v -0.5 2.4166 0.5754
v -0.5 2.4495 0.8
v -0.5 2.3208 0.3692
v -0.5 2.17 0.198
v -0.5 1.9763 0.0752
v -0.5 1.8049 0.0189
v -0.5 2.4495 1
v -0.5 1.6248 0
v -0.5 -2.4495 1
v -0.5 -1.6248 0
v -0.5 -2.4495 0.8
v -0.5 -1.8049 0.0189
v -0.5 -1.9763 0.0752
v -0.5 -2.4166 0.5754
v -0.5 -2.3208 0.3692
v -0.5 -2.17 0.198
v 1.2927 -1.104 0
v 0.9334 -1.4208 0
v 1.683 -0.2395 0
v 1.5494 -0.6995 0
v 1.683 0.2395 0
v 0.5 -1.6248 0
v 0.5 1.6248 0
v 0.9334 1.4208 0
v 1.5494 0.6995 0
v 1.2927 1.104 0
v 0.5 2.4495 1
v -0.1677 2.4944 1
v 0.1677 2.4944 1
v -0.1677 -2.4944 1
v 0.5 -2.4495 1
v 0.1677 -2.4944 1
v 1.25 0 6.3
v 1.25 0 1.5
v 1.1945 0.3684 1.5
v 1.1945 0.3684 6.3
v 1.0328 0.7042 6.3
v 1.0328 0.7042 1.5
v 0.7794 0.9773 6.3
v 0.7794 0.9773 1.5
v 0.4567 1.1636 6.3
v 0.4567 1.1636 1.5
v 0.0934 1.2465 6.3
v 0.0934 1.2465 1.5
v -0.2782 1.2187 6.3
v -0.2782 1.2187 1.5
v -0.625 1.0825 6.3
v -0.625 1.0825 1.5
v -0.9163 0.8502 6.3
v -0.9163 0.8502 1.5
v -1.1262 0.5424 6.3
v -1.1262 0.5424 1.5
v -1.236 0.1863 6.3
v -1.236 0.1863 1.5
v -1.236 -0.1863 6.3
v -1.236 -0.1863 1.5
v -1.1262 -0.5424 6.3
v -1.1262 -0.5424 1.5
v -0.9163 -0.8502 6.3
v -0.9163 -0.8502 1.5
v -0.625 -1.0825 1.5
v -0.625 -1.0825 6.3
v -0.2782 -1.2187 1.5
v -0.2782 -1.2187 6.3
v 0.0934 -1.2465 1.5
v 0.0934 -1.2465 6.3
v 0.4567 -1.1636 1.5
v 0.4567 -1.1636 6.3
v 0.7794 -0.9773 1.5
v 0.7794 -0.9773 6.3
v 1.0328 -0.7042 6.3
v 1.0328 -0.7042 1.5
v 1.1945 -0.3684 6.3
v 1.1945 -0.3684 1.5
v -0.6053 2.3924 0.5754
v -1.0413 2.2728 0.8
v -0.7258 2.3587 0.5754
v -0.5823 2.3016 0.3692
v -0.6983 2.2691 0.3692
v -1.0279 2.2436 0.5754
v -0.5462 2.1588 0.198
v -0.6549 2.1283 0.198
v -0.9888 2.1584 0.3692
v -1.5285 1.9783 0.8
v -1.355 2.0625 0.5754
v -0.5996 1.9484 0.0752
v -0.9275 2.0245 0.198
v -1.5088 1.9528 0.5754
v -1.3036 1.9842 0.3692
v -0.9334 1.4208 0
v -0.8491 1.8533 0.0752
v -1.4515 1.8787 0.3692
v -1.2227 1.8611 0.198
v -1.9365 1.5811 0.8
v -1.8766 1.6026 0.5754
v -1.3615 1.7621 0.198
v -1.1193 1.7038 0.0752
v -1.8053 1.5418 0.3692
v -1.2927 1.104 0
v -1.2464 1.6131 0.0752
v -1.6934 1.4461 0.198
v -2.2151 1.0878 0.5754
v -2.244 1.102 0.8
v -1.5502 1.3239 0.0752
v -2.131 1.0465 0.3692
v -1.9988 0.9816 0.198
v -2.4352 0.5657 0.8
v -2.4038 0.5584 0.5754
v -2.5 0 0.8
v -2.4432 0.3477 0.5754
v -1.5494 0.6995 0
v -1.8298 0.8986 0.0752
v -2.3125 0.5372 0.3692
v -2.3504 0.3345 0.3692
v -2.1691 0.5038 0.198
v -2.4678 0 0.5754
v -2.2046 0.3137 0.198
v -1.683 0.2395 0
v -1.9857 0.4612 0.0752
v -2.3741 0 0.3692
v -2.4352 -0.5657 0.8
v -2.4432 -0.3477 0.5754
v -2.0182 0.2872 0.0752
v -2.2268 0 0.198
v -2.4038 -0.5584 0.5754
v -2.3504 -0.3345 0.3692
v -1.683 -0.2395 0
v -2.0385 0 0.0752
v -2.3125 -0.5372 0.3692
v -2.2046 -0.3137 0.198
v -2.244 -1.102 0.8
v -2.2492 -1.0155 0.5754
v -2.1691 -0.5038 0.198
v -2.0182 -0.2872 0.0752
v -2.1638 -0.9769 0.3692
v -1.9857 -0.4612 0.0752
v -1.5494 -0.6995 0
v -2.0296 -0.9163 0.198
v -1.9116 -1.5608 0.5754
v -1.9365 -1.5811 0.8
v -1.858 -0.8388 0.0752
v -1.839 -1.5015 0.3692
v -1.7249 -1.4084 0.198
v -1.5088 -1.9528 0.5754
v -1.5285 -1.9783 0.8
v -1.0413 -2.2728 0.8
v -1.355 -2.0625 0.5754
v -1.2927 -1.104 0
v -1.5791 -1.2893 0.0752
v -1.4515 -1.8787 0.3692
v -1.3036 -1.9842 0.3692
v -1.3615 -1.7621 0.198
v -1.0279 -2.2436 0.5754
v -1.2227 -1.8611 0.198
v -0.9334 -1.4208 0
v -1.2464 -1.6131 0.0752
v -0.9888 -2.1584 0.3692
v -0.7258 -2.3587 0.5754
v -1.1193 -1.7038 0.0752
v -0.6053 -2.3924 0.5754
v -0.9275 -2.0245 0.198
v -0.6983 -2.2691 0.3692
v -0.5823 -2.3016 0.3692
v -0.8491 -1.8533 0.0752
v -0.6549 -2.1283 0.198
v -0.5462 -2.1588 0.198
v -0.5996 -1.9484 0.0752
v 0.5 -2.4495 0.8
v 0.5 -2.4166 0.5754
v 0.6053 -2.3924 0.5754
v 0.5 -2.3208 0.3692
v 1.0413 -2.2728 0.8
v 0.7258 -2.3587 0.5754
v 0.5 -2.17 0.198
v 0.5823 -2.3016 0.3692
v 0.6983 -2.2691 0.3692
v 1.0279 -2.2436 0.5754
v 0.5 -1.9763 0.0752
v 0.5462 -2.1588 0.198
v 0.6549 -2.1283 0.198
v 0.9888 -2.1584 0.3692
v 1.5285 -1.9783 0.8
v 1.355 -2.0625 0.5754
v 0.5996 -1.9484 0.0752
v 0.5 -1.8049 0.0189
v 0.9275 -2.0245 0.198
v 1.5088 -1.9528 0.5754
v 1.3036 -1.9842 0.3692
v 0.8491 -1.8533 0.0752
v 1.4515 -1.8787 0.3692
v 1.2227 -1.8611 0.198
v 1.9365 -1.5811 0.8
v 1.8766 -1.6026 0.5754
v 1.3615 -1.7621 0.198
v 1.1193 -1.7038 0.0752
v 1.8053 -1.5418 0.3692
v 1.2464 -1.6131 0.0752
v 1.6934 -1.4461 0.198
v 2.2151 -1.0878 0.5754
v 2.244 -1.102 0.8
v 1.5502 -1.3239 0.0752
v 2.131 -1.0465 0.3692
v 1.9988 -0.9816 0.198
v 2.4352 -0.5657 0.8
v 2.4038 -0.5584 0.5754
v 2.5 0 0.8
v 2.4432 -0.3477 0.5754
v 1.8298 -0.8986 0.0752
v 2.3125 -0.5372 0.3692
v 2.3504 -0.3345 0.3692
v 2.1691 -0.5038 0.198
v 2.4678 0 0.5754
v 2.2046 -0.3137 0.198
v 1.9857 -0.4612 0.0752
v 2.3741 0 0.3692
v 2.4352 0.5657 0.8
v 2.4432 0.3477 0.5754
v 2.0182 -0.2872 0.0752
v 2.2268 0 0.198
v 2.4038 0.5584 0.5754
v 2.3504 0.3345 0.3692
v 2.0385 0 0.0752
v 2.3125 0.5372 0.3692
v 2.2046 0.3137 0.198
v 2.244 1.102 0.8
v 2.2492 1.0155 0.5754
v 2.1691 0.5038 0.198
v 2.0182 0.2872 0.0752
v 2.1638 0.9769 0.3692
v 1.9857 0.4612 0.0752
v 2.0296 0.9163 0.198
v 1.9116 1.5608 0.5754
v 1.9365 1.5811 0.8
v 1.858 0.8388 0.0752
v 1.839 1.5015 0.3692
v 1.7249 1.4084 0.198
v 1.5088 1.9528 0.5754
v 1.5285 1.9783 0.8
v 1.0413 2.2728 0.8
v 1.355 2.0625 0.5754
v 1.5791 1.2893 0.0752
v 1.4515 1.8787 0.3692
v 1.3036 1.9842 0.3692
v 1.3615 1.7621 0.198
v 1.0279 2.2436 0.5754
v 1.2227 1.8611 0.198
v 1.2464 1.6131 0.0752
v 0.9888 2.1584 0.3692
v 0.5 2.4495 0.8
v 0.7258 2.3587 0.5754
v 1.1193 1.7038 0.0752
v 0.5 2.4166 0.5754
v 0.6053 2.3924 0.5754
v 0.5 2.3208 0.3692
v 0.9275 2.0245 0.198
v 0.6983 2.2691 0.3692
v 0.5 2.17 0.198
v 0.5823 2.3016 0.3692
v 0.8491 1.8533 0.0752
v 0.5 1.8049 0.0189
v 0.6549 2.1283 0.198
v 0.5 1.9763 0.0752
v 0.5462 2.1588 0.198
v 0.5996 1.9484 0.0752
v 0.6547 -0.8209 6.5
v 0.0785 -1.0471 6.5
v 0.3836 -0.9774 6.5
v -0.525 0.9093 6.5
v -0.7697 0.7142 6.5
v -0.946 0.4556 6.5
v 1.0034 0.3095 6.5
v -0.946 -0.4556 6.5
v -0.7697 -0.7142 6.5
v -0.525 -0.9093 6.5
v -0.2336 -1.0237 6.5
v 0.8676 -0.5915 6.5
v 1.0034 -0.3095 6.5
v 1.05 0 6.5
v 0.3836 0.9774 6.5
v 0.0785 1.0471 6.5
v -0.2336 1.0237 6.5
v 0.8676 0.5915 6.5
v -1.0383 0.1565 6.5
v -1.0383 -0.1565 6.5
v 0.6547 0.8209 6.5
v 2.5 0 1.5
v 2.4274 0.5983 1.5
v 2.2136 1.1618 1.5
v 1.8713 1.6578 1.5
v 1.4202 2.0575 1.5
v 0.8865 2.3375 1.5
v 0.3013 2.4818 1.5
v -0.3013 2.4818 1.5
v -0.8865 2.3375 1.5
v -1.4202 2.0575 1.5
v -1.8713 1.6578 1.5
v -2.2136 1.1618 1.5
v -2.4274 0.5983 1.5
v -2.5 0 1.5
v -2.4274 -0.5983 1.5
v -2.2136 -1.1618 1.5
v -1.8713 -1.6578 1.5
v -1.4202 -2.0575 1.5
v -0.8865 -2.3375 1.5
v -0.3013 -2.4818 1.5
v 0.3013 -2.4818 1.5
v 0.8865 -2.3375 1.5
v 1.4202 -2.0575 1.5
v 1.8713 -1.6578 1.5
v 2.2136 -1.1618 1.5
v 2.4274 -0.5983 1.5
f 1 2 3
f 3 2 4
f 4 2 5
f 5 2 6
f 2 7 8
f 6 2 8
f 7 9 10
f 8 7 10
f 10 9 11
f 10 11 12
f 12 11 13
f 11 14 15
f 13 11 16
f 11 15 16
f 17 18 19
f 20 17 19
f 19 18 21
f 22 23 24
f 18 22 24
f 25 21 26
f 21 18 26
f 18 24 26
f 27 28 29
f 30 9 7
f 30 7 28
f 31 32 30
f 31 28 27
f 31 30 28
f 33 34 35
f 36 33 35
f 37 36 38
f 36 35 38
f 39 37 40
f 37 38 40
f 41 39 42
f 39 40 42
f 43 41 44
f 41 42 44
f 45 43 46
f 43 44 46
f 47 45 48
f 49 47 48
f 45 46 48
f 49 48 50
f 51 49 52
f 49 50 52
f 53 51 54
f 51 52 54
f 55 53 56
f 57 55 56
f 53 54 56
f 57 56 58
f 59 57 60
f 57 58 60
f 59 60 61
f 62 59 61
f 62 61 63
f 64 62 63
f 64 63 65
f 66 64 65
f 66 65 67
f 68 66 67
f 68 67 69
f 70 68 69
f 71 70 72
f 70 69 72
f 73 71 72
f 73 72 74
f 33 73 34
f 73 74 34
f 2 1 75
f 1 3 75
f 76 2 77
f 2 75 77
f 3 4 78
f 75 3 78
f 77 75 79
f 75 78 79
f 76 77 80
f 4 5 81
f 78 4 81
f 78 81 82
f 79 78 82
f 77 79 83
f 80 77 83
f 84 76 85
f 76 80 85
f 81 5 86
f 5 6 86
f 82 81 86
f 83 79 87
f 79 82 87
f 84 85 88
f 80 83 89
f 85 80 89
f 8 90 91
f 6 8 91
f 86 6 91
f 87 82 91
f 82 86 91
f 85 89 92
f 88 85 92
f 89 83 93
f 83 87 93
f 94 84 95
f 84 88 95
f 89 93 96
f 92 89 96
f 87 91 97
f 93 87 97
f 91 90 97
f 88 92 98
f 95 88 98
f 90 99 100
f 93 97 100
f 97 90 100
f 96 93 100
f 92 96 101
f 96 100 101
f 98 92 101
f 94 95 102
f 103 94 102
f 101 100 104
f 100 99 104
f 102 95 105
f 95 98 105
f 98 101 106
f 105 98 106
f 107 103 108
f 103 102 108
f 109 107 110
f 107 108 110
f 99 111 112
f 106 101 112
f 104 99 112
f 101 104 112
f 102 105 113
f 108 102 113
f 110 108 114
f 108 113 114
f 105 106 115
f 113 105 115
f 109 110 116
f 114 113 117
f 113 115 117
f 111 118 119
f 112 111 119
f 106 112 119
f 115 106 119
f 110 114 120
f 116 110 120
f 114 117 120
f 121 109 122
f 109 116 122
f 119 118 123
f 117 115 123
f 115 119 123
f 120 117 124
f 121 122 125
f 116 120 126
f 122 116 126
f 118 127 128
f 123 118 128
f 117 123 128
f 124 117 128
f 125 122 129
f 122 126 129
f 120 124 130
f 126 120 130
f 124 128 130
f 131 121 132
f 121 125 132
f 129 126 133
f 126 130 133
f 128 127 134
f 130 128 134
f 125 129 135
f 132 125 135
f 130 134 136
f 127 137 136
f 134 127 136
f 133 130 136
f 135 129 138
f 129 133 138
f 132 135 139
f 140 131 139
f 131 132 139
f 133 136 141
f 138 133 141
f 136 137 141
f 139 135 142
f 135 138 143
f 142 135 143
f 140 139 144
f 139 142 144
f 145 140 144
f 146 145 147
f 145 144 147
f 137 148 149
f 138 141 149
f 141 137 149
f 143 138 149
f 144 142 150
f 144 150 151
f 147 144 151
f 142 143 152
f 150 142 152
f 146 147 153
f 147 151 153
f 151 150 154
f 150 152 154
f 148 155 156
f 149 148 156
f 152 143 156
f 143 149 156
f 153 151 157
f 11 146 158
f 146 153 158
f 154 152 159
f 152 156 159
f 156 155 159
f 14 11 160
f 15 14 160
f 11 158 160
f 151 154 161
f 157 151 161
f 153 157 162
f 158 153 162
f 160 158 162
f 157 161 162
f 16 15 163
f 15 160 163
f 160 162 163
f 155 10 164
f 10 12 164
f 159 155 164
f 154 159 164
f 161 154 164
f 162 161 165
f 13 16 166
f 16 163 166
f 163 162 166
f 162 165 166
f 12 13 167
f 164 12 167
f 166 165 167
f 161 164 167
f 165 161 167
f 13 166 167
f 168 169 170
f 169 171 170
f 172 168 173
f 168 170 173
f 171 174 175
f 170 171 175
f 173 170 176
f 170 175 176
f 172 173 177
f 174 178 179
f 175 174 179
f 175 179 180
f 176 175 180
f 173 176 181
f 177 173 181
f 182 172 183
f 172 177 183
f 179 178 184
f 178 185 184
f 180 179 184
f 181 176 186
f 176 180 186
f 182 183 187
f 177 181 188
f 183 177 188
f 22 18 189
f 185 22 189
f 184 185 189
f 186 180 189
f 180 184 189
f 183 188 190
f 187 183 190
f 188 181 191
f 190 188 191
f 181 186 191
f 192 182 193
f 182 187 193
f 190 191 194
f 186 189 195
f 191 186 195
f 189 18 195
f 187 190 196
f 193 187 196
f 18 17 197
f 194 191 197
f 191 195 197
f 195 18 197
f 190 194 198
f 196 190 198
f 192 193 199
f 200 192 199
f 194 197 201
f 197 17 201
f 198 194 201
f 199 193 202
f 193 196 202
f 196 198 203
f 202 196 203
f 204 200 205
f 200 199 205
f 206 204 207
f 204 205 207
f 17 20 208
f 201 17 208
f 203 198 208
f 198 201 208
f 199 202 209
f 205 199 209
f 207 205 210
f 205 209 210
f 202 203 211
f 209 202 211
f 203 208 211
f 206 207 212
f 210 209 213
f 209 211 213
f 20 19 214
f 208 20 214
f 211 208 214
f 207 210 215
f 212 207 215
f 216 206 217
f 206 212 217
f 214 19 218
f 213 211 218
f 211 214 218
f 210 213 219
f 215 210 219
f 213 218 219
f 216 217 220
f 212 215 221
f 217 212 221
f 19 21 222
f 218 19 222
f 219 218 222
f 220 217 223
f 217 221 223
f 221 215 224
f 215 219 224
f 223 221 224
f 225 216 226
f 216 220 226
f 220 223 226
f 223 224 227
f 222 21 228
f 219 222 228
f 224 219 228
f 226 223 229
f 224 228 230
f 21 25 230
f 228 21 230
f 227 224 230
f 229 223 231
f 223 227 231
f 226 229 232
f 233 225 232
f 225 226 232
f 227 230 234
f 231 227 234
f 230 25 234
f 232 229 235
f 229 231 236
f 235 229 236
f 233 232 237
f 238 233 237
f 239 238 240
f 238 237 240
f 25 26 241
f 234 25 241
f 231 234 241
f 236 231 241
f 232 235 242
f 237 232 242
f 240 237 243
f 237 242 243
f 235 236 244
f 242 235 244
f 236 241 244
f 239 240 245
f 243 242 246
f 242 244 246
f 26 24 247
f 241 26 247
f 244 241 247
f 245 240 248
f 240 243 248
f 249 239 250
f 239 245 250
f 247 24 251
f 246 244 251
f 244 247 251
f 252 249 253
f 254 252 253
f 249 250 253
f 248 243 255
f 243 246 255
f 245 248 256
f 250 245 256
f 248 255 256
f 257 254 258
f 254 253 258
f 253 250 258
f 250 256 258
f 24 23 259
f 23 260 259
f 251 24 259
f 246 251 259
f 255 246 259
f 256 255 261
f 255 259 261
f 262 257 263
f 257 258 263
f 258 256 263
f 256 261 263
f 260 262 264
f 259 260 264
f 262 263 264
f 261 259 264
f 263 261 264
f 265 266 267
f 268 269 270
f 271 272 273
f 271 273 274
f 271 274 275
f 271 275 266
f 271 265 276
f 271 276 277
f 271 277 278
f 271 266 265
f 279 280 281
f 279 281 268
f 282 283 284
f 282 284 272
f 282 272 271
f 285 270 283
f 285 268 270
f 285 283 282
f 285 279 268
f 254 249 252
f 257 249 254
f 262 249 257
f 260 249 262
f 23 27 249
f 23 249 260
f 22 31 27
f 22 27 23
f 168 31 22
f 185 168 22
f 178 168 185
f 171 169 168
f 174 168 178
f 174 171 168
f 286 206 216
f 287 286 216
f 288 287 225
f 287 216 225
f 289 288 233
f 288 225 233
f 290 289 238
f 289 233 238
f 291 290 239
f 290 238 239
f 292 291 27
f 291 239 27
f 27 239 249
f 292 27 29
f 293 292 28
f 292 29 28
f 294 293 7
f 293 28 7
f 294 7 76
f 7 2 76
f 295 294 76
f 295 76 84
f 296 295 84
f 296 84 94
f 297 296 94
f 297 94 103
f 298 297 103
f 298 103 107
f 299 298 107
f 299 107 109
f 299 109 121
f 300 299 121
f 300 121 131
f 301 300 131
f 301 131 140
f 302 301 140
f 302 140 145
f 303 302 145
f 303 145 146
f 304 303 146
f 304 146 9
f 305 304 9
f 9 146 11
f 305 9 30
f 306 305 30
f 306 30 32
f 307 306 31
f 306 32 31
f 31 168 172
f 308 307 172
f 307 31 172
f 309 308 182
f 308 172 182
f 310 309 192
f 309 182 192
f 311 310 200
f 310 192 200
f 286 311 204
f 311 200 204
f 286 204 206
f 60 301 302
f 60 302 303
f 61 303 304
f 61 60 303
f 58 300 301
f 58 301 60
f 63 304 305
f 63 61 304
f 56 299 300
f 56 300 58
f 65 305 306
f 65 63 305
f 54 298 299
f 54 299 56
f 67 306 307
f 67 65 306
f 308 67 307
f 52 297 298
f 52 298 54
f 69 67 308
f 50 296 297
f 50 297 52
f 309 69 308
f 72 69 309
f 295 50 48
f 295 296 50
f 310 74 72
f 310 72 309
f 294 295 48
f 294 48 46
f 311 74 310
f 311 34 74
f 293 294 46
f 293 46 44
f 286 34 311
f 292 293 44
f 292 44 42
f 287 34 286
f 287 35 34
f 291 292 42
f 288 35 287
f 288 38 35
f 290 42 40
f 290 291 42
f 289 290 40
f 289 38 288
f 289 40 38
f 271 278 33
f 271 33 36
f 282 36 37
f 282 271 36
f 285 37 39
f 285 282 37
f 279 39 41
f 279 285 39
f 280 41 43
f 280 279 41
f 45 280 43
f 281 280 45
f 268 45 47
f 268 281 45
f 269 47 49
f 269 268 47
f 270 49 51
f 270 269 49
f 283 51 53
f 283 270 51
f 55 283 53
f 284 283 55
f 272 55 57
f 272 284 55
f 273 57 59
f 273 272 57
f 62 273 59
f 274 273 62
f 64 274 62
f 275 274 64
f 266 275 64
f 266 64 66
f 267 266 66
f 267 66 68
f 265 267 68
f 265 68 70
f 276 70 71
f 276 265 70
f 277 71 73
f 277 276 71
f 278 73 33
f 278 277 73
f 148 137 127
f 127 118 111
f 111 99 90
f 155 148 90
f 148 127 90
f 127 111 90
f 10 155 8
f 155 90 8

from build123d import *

# Parameters (mm, degrees)
ESQUISSE1_R                  = 2.5
BASE_EXTRUSION_DEPTH         = 1.5
CONG_1_R                     = 0.8
ESQUISSE2_R                  = 1.25
BOSS_EXTRU_1_DEPTH           = 5
CHANFREIN1_SIZE              = 0.2
ESQUISSE3_W                  = 1
ESQUISSE3_H                  = 1
ENL_V_MAT_EXTRU_1_DEPTH      = 3.5
ENL_V_MAT_EXTRU_1_DEPTH_BACK = 3.5


with BuildPart() as part:
    # Esquisse1 → Base-Extrusion (new body)
    with BuildSketch(Plane.XY):
        Circle(ESQUISSE1_R)
    extrude(amount=BASE_EXTRUSION_DEPTH)

    # Cong_1
    cong_1_edges = [part.edges().sort_by_distance(p)[0] for p in [
        (-2.5, 0, 0),
    ]]
    fillet(cong_1_edges, radius=CONG_1_R)

    # Esquisse2 → Boss.-Extru.1 (add)
    with BuildSketch(Plane.XY.offset(1.5)):
        Circle(ESQUISSE2_R)
    extrude(amount=BOSS_EXTRU_1_DEPTH)

    # Chanfrein1
    chanfrein1_edges = [part.edges().sort_by_distance(p)[0] for p in [
        (-1.25, 0, 6.5),
    ]]
    chamfer(chanfrein1_edges, length=CHANFREIN1_SIZE)

    # Esquisse3 → Enl_v. mat.-Extru.1 (cut, two sides)
    with BuildSketch(Plane(origin=(0, 0, 0), x_dir=(1, 0, 0), z_dir=(0, 1, 0))) as enl_v_mat_extru_1_sk:
        with Locations((0, -0.5)):
            Rectangle(ESQUISSE3_W, ESQUISSE3_H)
    extrude(amount=ENL_V_MAT_EXTRU_1_DEPTH, mode=Mode.SUBTRACT)
    extrude(enl_v_mat_extru_1_sk.sketch, amount=-ENL_V_MAT_EXTRU_1_DEPTH_BACK, mode=Mode.SUBTRACT)


solid = part.part
